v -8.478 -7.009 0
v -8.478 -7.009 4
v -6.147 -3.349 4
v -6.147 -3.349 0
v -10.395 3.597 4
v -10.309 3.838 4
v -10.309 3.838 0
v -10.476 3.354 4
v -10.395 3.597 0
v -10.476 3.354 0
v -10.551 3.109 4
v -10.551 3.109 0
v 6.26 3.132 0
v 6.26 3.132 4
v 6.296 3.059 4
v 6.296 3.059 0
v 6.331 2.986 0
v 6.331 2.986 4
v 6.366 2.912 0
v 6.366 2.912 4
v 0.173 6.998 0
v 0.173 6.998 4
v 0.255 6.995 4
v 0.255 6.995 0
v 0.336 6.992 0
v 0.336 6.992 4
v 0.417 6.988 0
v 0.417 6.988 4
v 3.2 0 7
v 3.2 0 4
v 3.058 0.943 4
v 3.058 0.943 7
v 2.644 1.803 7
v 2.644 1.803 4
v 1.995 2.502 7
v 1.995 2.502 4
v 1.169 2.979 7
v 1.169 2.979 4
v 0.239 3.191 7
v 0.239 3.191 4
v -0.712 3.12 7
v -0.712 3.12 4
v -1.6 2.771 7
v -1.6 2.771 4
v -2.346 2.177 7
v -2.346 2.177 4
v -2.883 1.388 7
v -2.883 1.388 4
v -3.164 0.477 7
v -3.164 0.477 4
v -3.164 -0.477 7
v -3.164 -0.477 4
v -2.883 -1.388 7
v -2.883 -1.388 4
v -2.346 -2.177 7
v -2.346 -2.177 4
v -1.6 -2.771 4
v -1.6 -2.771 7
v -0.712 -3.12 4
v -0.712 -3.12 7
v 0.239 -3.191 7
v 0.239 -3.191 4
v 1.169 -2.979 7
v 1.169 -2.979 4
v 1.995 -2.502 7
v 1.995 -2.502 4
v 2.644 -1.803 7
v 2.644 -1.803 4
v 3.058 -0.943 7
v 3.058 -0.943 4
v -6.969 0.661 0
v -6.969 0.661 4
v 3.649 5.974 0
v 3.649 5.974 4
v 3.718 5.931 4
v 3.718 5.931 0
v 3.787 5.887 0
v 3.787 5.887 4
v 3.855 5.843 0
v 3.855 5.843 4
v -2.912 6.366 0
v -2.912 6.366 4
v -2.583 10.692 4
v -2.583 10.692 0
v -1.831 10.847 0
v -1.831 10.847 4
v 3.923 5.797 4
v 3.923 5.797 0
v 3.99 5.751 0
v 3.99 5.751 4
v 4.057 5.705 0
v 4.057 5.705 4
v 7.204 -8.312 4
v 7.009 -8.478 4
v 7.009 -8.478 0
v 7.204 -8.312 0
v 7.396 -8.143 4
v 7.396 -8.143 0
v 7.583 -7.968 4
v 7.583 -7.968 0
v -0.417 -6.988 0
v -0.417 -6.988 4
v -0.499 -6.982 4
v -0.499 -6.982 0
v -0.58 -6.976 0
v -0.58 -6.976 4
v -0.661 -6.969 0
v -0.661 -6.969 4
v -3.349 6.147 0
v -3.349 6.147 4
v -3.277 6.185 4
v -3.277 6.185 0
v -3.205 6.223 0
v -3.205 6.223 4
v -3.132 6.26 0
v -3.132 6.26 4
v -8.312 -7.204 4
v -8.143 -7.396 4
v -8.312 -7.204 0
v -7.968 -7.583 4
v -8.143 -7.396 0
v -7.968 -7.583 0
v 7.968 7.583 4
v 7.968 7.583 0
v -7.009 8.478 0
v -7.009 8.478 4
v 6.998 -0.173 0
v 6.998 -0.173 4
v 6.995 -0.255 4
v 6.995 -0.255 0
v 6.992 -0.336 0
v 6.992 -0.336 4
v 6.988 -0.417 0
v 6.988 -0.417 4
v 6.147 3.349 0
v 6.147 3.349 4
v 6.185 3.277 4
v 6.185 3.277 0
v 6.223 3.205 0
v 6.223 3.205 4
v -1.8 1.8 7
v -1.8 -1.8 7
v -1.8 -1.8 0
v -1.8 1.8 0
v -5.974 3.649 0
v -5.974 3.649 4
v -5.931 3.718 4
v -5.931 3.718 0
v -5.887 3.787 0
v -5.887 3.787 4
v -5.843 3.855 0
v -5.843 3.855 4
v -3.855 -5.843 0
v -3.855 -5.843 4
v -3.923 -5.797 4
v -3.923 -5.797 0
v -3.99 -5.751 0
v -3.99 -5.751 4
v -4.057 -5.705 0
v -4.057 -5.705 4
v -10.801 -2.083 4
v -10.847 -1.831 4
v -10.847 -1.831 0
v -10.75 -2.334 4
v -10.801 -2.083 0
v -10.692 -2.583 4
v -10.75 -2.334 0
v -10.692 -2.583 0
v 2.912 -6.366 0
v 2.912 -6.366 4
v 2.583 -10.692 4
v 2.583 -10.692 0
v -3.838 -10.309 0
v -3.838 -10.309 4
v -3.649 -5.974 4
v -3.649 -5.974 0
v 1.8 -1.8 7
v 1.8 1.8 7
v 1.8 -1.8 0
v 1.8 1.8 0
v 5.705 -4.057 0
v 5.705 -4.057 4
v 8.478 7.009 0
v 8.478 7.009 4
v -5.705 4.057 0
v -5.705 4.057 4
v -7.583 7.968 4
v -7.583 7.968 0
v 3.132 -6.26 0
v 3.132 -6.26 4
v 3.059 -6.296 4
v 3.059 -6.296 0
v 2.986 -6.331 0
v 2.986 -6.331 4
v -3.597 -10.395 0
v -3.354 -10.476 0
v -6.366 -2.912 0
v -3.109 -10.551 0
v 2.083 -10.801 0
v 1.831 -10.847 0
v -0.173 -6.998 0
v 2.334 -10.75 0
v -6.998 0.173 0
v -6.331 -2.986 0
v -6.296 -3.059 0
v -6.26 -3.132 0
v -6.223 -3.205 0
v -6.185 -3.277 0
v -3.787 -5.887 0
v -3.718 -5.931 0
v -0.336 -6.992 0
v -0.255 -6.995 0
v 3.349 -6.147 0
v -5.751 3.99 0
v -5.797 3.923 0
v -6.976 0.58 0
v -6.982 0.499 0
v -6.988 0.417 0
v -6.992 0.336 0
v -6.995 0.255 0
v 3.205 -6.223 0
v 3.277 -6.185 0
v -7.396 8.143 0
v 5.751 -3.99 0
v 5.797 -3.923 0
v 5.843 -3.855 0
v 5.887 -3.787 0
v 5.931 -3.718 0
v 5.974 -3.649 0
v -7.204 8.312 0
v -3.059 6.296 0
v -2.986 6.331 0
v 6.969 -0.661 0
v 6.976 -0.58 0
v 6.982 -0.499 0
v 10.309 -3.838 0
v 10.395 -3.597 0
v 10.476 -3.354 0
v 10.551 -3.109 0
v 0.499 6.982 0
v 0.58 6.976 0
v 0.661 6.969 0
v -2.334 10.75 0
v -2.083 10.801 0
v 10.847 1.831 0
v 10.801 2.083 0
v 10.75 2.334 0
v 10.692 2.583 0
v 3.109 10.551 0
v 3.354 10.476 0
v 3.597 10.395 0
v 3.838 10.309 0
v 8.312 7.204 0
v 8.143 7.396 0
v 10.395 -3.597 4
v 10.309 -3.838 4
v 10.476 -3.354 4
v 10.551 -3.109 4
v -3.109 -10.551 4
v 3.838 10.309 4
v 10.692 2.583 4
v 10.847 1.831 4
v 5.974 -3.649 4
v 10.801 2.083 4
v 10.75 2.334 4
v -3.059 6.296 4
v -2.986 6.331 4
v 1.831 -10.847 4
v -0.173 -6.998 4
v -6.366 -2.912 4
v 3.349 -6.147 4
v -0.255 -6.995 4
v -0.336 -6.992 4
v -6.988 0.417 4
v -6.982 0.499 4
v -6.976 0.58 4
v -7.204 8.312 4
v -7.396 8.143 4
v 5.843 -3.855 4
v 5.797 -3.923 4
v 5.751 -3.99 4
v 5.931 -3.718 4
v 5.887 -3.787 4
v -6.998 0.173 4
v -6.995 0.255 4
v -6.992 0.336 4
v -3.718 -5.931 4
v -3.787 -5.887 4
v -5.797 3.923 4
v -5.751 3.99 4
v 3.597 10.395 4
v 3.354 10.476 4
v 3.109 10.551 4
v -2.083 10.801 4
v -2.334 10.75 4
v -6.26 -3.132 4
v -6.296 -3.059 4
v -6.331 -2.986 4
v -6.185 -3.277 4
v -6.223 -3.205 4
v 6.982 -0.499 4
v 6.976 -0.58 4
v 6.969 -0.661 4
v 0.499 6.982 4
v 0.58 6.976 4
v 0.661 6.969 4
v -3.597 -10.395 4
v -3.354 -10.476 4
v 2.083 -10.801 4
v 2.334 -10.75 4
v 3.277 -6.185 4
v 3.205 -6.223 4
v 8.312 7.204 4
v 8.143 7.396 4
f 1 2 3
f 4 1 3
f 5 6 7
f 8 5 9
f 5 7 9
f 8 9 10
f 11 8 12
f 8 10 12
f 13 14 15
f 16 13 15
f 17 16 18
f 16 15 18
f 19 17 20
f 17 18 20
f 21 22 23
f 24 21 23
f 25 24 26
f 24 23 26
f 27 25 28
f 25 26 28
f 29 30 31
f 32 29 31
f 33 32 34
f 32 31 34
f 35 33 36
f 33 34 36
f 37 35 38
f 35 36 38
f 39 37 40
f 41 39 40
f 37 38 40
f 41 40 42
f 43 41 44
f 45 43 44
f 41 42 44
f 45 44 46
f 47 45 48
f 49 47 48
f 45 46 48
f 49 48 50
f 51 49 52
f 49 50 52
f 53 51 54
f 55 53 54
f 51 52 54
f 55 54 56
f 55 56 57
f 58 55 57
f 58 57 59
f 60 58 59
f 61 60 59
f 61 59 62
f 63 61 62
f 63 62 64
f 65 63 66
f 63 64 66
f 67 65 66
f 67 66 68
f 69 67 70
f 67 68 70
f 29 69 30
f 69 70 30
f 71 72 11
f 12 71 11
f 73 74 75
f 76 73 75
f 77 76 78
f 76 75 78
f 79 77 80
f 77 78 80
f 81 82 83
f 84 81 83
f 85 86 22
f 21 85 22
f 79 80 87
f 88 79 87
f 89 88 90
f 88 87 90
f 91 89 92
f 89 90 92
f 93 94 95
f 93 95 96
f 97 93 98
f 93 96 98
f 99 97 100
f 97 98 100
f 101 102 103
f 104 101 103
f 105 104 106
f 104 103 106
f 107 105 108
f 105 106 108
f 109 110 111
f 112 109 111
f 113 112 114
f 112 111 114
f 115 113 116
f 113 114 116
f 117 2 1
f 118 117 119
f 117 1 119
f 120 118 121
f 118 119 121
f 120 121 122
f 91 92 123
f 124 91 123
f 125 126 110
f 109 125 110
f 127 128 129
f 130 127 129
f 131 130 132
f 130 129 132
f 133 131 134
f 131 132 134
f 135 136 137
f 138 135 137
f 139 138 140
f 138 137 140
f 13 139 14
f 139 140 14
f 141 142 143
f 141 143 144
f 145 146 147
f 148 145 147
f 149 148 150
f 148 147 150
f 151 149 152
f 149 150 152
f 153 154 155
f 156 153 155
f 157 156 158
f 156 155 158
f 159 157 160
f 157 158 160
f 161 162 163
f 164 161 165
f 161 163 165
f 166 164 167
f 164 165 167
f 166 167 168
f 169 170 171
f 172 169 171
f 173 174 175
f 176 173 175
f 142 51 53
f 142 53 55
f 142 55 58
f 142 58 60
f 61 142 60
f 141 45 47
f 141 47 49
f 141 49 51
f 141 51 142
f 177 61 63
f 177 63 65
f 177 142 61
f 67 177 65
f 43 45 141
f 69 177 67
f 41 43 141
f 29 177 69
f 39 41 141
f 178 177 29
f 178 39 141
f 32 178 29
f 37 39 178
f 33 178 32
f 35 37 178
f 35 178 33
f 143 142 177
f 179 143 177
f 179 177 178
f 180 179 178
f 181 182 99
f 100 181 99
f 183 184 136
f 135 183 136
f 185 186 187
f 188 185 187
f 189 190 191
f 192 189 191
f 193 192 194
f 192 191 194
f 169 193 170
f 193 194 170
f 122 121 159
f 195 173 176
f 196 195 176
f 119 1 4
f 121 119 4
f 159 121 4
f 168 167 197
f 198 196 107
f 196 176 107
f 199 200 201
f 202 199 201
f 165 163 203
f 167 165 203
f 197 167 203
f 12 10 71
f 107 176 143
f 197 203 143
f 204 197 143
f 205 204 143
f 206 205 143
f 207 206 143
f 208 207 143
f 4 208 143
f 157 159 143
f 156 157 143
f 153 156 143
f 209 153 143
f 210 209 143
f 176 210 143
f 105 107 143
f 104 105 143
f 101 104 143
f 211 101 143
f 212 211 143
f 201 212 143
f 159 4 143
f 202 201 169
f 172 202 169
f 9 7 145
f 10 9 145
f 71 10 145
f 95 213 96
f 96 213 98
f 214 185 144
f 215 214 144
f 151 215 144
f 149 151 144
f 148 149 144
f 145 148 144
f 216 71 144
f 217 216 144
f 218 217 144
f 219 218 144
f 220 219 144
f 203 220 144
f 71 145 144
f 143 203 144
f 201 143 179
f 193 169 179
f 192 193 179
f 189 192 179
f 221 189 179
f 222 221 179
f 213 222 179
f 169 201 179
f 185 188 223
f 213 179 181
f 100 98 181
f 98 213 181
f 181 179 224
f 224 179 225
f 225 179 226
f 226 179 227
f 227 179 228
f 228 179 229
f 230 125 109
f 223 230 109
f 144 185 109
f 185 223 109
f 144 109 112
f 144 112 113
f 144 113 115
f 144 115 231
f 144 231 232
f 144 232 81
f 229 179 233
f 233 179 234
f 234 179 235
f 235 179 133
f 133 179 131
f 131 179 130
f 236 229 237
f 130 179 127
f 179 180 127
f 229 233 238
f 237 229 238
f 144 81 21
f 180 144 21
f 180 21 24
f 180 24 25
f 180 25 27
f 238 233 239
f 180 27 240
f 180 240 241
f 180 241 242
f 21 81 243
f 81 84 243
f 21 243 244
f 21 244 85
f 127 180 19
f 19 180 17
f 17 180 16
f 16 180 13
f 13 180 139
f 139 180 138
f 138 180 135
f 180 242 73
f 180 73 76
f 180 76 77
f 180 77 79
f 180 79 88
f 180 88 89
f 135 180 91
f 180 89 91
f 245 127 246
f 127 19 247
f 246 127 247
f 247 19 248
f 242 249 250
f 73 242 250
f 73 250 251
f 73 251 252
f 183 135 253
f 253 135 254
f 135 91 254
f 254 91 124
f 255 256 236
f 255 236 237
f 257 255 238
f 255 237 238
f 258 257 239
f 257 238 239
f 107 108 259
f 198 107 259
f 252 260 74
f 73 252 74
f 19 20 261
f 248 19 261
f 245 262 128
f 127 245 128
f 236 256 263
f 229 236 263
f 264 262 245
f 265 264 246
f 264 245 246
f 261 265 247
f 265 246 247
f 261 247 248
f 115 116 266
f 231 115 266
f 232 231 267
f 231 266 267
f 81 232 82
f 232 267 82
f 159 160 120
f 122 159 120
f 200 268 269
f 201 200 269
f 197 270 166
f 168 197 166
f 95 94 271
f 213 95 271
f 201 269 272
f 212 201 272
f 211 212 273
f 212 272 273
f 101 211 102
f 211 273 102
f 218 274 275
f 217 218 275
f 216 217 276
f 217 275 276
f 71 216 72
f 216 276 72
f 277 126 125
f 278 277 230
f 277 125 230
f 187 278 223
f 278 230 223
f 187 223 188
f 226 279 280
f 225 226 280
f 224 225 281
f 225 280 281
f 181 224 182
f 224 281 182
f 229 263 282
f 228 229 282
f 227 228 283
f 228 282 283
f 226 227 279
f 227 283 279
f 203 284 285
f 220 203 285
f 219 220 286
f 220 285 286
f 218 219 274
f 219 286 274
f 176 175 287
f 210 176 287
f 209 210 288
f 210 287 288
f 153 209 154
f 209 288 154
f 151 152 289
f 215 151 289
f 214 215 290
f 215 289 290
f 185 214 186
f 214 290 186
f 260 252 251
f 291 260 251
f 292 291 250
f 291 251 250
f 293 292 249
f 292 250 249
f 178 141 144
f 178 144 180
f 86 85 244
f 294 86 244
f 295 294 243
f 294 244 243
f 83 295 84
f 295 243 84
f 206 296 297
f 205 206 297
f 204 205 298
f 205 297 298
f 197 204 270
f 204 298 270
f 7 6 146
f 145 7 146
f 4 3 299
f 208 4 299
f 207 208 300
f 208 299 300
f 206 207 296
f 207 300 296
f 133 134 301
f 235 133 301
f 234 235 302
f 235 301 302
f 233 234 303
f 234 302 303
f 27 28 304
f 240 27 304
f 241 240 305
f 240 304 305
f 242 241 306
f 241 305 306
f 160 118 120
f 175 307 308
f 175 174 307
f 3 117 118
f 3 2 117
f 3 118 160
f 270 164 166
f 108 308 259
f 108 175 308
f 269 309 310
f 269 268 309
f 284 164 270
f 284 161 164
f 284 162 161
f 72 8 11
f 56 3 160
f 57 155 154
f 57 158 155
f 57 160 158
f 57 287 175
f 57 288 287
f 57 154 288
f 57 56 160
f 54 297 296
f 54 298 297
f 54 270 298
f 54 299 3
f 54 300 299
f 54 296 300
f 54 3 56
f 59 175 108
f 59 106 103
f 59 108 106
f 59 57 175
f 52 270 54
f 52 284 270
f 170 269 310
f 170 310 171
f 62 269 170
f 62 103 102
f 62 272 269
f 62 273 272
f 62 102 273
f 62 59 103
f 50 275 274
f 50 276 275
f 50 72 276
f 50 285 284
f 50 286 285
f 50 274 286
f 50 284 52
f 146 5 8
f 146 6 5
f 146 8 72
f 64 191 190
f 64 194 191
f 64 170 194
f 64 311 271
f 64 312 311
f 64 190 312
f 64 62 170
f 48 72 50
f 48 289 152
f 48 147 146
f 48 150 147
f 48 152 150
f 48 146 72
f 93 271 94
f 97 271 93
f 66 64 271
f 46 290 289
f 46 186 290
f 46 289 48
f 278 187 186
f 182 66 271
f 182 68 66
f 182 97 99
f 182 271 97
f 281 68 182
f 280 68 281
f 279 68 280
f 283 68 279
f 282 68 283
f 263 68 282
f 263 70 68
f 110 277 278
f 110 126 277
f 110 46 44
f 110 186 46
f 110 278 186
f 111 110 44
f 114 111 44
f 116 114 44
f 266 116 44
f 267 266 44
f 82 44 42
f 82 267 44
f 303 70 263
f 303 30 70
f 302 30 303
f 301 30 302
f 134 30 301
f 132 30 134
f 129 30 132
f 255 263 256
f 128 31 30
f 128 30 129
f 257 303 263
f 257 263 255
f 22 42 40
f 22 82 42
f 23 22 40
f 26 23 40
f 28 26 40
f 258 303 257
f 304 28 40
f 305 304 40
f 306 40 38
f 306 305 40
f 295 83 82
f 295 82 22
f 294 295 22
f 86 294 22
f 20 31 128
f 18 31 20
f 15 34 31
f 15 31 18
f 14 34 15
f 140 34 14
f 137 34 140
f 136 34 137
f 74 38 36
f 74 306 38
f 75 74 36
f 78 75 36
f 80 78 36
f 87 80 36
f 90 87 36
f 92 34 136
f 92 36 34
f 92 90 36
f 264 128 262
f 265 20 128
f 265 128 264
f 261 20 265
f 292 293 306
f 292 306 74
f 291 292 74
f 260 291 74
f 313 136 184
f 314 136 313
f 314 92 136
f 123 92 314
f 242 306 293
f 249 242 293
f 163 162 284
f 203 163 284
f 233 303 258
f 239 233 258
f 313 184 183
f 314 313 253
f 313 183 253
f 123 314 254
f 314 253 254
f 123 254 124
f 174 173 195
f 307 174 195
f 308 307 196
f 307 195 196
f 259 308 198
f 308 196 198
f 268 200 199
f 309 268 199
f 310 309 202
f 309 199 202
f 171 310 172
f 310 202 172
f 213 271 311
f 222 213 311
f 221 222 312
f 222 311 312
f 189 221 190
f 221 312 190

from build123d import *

# Parameters (mm, degrees)
F0_R            = 11
F1_DEPTH        = 4
F3_DEPTH        = 4.001
F3_COPIES_COUNT = 12
F5_R            = 3.2
F6_DEPTH        = 3
F7_W            = 3.6
F7_H            = 3.6
F8_DEPTH        = 7.001


# Not quite as in the source:
# - a pattern or mirror of a feature is missing from the dataset's text; its kind, count and spacing are read off the source's solid


with BuildPart() as f1:
    # F0 (on Top) → F1 (new body)
    with BuildSketch(Plane.XY):
        Circle(F0_R)
    extrude(amount=F1_DEPTH)

    # F2 (on face) → F3 (cut, through all)
    with BuildSketch(Plane.XY.offset(4)):
        with BuildLine():
            ThreePointArc((-3.3489182935, 6.1469298242), (-3.2411295194, 6.2044403002), (-3.1323534658, 6.2600608436))
            Line((-3.1323534658, 6.2600608436), (-4.922269732, 9.8372384685))
            ThreePointArc((-4.922269732, 9.8372384685), (-6.004235681, 9.2167865272), (-7.0090094429, 8.4778409179))
            Line((-7.0090094429, 8.4778409179), (-3.3489182935, 6.1469298242))
        make_face()
        with BuildLine():
            Line((-4.922269732, 9.8372384685), (-3.1323534658, 6.2600608436))
            ThreePointArc((-3.1323534658, 6.2600608436), (-3.022623267, 6.3137745118), (-2.9119723479, 6.3655649431))
            Line((-2.9119723479, 6.3655649431), (-2.5832151123, 10.6923804498))
            ThreePointArc((-2.5832151123, 10.6923804498), (-3.7770216625, 10.3312200326), (-4.922269732, 9.8372384685))
        make_face()
    f3 = extrude(amount=-F3_DEPTH, mode=Mode.SUBTRACT)

    # F3_copies: F3 ×12 about axis
    f3_copies_axis = Axis((0, 0, 0), (0, 0, 1))
    for i in range(1, F3_COPIES_COUNT):
        add(f3.rotate(f3_copies_axis, i * 360 / F3_COPIES_COUNT), mode=Mode.SUBTRACT)

    # F5 (on face) → F6 (join)
    with BuildSketch(Plane.XY.offset(4)):
        Circle(F5_R)
    extrude(amount=F6_DEPTH)

    # F7 (on face) → F8 (cut, through all)
    with BuildSketch(Plane.XY.offset(7)):
        Rectangle(F7_W, F7_H)
    extrude(amount=-F8_DEPTH, mode=Mode.SUBTRACT)


solid = f1.part
